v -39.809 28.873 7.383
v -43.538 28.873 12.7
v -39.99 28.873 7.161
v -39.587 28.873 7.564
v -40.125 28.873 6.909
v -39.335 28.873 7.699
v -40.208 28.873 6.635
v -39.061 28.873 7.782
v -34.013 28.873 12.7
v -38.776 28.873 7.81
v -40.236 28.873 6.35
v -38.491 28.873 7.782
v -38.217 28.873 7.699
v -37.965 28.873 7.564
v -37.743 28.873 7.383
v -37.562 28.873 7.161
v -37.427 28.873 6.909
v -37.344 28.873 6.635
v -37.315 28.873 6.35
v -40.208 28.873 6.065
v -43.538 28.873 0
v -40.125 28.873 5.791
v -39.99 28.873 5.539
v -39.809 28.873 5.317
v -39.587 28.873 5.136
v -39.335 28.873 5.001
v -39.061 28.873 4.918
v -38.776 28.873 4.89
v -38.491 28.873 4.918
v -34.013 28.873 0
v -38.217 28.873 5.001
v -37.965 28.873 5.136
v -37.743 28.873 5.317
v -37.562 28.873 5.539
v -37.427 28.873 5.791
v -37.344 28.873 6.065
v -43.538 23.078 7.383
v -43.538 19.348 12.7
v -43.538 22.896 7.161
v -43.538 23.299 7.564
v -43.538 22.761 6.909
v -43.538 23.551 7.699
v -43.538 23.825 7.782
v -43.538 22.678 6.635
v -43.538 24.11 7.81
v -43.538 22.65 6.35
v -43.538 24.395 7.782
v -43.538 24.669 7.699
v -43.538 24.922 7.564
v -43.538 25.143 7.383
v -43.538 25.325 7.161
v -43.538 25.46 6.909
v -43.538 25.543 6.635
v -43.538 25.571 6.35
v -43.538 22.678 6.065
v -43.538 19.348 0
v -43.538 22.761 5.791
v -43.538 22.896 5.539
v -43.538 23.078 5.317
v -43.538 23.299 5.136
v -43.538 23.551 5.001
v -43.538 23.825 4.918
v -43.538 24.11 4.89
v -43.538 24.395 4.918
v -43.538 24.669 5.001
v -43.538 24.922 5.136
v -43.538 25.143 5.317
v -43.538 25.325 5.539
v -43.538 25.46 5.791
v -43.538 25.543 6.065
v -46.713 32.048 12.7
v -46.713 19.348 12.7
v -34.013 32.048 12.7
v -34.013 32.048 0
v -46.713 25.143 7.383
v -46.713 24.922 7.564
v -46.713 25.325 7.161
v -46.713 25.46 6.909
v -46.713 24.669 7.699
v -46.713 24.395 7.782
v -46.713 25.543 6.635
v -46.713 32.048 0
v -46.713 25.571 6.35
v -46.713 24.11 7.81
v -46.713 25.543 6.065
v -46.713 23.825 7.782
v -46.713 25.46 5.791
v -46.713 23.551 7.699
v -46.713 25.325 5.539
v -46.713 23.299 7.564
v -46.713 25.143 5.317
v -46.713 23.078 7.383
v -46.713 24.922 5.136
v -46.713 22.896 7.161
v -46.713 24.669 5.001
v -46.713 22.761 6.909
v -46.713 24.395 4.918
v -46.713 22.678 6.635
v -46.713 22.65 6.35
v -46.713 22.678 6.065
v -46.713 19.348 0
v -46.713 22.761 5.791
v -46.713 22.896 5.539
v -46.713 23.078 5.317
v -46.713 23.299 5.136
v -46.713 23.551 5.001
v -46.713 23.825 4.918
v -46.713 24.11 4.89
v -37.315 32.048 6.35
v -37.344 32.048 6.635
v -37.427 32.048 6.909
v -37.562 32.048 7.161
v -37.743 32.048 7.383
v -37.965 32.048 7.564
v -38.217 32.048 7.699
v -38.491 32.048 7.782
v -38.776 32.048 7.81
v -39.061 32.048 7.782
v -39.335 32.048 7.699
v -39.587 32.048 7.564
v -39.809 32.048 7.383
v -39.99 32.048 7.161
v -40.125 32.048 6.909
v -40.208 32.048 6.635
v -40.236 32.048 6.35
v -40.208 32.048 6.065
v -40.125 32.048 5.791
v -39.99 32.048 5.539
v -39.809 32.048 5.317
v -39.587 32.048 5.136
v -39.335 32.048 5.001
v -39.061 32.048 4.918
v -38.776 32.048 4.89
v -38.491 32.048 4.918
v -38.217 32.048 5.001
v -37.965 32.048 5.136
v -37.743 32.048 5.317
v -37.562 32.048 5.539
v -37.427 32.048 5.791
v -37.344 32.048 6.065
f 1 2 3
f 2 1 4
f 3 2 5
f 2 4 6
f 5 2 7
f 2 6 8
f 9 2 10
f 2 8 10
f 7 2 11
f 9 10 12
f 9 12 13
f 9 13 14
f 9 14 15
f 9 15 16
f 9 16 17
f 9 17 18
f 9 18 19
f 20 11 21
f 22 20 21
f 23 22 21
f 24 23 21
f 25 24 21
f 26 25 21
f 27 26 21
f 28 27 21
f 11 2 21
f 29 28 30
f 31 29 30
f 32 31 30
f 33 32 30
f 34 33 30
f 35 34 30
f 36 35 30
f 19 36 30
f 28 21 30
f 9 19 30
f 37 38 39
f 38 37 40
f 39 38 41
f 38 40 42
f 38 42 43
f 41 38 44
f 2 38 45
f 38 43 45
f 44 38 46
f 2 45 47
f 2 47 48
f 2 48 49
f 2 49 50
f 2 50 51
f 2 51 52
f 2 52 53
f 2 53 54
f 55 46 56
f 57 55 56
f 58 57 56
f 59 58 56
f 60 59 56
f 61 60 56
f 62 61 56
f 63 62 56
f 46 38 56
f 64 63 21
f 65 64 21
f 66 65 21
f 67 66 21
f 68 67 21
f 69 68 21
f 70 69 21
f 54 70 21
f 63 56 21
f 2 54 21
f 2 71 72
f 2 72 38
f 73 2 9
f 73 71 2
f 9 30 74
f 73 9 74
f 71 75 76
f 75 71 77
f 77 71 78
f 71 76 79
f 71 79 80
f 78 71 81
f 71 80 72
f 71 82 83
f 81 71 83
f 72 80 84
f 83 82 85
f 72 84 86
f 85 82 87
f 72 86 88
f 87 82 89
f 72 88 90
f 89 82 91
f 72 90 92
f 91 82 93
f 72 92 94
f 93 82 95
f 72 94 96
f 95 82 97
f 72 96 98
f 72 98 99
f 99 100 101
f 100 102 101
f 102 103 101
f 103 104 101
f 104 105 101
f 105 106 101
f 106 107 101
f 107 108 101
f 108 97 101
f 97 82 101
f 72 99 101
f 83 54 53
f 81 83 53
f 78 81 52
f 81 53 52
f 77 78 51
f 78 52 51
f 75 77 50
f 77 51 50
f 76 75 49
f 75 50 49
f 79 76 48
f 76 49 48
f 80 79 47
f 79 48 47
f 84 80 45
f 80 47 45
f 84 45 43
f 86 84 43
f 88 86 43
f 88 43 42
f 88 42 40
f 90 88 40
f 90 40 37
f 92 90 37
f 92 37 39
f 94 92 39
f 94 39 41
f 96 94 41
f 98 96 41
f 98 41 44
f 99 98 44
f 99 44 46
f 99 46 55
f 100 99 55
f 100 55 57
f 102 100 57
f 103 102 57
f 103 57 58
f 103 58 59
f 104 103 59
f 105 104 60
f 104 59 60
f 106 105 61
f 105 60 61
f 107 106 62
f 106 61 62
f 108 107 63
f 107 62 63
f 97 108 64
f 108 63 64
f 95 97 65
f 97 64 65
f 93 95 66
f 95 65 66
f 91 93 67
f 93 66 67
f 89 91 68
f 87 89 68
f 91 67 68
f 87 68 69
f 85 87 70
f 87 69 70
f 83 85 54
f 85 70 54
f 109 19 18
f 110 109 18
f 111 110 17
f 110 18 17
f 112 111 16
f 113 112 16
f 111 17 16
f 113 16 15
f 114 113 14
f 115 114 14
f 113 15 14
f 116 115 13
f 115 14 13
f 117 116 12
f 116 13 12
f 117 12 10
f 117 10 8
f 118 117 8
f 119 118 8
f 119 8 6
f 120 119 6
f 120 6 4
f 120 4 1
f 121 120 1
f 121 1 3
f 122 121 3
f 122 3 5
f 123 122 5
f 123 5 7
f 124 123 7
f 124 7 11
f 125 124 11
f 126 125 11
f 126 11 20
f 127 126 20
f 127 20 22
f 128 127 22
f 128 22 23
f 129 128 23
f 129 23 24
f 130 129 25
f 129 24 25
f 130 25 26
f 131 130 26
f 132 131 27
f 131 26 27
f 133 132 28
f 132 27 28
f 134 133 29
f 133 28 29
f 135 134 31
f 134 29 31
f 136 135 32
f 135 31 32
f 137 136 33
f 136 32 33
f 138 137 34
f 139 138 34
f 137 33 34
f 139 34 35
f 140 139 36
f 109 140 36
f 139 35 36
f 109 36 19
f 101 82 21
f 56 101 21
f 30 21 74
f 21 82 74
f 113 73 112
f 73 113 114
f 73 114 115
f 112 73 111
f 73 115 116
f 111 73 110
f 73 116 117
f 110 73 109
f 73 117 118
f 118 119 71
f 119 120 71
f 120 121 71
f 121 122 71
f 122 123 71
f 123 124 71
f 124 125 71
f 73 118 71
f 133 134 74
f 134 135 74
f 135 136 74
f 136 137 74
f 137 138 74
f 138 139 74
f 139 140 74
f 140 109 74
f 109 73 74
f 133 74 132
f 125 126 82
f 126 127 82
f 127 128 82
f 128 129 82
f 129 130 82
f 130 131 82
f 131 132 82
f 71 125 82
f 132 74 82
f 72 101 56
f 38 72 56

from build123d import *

# Parameters (mm, degrees)
F0_W     = 9.525
F0_H     = 3.175
F1_DEPTH = 12.7
F2_R     = 1.4605
F4_DEPTH = 25.4
F3_R     = 1.4605
F5_DEPTH = 25.4


with BuildPart() as f1:
    # F0 (on Top) → F1 (new body)
    with BuildSketch(Plane.XY):
        Polygon((-46.713472, 32.047768), (-46.713472, 19.347768), (-43.538472, 19.347768), (-43.538472, 28.872768), (-43.538472, 32.047768), align=None)
        with Locations((-38.775972, 30.460268)):
            Rectangle(F0_W, F0_H)
    extrude(amount=F1_DEPTH)

    # F2 (on face) → F4 (cut)
    with BuildSketch(Plane.XZ.offset(-28.872768)):
        with Locations((-38.775972, 6.35)):
            Circle(F2_R)
    extrude(amount=-F4_DEPTH, mode=Mode.SUBTRACT)

    # F3 (on face) → F5 (cut)
    with BuildSketch(Plane.YZ.offset(-43.538472)):
        with Locations((24.110268, 6.35)):
            Circle(F3_R)
    extrude(amount=-F5_DEPTH, mode=Mode.SUBTRACT)


solid = f1.part
